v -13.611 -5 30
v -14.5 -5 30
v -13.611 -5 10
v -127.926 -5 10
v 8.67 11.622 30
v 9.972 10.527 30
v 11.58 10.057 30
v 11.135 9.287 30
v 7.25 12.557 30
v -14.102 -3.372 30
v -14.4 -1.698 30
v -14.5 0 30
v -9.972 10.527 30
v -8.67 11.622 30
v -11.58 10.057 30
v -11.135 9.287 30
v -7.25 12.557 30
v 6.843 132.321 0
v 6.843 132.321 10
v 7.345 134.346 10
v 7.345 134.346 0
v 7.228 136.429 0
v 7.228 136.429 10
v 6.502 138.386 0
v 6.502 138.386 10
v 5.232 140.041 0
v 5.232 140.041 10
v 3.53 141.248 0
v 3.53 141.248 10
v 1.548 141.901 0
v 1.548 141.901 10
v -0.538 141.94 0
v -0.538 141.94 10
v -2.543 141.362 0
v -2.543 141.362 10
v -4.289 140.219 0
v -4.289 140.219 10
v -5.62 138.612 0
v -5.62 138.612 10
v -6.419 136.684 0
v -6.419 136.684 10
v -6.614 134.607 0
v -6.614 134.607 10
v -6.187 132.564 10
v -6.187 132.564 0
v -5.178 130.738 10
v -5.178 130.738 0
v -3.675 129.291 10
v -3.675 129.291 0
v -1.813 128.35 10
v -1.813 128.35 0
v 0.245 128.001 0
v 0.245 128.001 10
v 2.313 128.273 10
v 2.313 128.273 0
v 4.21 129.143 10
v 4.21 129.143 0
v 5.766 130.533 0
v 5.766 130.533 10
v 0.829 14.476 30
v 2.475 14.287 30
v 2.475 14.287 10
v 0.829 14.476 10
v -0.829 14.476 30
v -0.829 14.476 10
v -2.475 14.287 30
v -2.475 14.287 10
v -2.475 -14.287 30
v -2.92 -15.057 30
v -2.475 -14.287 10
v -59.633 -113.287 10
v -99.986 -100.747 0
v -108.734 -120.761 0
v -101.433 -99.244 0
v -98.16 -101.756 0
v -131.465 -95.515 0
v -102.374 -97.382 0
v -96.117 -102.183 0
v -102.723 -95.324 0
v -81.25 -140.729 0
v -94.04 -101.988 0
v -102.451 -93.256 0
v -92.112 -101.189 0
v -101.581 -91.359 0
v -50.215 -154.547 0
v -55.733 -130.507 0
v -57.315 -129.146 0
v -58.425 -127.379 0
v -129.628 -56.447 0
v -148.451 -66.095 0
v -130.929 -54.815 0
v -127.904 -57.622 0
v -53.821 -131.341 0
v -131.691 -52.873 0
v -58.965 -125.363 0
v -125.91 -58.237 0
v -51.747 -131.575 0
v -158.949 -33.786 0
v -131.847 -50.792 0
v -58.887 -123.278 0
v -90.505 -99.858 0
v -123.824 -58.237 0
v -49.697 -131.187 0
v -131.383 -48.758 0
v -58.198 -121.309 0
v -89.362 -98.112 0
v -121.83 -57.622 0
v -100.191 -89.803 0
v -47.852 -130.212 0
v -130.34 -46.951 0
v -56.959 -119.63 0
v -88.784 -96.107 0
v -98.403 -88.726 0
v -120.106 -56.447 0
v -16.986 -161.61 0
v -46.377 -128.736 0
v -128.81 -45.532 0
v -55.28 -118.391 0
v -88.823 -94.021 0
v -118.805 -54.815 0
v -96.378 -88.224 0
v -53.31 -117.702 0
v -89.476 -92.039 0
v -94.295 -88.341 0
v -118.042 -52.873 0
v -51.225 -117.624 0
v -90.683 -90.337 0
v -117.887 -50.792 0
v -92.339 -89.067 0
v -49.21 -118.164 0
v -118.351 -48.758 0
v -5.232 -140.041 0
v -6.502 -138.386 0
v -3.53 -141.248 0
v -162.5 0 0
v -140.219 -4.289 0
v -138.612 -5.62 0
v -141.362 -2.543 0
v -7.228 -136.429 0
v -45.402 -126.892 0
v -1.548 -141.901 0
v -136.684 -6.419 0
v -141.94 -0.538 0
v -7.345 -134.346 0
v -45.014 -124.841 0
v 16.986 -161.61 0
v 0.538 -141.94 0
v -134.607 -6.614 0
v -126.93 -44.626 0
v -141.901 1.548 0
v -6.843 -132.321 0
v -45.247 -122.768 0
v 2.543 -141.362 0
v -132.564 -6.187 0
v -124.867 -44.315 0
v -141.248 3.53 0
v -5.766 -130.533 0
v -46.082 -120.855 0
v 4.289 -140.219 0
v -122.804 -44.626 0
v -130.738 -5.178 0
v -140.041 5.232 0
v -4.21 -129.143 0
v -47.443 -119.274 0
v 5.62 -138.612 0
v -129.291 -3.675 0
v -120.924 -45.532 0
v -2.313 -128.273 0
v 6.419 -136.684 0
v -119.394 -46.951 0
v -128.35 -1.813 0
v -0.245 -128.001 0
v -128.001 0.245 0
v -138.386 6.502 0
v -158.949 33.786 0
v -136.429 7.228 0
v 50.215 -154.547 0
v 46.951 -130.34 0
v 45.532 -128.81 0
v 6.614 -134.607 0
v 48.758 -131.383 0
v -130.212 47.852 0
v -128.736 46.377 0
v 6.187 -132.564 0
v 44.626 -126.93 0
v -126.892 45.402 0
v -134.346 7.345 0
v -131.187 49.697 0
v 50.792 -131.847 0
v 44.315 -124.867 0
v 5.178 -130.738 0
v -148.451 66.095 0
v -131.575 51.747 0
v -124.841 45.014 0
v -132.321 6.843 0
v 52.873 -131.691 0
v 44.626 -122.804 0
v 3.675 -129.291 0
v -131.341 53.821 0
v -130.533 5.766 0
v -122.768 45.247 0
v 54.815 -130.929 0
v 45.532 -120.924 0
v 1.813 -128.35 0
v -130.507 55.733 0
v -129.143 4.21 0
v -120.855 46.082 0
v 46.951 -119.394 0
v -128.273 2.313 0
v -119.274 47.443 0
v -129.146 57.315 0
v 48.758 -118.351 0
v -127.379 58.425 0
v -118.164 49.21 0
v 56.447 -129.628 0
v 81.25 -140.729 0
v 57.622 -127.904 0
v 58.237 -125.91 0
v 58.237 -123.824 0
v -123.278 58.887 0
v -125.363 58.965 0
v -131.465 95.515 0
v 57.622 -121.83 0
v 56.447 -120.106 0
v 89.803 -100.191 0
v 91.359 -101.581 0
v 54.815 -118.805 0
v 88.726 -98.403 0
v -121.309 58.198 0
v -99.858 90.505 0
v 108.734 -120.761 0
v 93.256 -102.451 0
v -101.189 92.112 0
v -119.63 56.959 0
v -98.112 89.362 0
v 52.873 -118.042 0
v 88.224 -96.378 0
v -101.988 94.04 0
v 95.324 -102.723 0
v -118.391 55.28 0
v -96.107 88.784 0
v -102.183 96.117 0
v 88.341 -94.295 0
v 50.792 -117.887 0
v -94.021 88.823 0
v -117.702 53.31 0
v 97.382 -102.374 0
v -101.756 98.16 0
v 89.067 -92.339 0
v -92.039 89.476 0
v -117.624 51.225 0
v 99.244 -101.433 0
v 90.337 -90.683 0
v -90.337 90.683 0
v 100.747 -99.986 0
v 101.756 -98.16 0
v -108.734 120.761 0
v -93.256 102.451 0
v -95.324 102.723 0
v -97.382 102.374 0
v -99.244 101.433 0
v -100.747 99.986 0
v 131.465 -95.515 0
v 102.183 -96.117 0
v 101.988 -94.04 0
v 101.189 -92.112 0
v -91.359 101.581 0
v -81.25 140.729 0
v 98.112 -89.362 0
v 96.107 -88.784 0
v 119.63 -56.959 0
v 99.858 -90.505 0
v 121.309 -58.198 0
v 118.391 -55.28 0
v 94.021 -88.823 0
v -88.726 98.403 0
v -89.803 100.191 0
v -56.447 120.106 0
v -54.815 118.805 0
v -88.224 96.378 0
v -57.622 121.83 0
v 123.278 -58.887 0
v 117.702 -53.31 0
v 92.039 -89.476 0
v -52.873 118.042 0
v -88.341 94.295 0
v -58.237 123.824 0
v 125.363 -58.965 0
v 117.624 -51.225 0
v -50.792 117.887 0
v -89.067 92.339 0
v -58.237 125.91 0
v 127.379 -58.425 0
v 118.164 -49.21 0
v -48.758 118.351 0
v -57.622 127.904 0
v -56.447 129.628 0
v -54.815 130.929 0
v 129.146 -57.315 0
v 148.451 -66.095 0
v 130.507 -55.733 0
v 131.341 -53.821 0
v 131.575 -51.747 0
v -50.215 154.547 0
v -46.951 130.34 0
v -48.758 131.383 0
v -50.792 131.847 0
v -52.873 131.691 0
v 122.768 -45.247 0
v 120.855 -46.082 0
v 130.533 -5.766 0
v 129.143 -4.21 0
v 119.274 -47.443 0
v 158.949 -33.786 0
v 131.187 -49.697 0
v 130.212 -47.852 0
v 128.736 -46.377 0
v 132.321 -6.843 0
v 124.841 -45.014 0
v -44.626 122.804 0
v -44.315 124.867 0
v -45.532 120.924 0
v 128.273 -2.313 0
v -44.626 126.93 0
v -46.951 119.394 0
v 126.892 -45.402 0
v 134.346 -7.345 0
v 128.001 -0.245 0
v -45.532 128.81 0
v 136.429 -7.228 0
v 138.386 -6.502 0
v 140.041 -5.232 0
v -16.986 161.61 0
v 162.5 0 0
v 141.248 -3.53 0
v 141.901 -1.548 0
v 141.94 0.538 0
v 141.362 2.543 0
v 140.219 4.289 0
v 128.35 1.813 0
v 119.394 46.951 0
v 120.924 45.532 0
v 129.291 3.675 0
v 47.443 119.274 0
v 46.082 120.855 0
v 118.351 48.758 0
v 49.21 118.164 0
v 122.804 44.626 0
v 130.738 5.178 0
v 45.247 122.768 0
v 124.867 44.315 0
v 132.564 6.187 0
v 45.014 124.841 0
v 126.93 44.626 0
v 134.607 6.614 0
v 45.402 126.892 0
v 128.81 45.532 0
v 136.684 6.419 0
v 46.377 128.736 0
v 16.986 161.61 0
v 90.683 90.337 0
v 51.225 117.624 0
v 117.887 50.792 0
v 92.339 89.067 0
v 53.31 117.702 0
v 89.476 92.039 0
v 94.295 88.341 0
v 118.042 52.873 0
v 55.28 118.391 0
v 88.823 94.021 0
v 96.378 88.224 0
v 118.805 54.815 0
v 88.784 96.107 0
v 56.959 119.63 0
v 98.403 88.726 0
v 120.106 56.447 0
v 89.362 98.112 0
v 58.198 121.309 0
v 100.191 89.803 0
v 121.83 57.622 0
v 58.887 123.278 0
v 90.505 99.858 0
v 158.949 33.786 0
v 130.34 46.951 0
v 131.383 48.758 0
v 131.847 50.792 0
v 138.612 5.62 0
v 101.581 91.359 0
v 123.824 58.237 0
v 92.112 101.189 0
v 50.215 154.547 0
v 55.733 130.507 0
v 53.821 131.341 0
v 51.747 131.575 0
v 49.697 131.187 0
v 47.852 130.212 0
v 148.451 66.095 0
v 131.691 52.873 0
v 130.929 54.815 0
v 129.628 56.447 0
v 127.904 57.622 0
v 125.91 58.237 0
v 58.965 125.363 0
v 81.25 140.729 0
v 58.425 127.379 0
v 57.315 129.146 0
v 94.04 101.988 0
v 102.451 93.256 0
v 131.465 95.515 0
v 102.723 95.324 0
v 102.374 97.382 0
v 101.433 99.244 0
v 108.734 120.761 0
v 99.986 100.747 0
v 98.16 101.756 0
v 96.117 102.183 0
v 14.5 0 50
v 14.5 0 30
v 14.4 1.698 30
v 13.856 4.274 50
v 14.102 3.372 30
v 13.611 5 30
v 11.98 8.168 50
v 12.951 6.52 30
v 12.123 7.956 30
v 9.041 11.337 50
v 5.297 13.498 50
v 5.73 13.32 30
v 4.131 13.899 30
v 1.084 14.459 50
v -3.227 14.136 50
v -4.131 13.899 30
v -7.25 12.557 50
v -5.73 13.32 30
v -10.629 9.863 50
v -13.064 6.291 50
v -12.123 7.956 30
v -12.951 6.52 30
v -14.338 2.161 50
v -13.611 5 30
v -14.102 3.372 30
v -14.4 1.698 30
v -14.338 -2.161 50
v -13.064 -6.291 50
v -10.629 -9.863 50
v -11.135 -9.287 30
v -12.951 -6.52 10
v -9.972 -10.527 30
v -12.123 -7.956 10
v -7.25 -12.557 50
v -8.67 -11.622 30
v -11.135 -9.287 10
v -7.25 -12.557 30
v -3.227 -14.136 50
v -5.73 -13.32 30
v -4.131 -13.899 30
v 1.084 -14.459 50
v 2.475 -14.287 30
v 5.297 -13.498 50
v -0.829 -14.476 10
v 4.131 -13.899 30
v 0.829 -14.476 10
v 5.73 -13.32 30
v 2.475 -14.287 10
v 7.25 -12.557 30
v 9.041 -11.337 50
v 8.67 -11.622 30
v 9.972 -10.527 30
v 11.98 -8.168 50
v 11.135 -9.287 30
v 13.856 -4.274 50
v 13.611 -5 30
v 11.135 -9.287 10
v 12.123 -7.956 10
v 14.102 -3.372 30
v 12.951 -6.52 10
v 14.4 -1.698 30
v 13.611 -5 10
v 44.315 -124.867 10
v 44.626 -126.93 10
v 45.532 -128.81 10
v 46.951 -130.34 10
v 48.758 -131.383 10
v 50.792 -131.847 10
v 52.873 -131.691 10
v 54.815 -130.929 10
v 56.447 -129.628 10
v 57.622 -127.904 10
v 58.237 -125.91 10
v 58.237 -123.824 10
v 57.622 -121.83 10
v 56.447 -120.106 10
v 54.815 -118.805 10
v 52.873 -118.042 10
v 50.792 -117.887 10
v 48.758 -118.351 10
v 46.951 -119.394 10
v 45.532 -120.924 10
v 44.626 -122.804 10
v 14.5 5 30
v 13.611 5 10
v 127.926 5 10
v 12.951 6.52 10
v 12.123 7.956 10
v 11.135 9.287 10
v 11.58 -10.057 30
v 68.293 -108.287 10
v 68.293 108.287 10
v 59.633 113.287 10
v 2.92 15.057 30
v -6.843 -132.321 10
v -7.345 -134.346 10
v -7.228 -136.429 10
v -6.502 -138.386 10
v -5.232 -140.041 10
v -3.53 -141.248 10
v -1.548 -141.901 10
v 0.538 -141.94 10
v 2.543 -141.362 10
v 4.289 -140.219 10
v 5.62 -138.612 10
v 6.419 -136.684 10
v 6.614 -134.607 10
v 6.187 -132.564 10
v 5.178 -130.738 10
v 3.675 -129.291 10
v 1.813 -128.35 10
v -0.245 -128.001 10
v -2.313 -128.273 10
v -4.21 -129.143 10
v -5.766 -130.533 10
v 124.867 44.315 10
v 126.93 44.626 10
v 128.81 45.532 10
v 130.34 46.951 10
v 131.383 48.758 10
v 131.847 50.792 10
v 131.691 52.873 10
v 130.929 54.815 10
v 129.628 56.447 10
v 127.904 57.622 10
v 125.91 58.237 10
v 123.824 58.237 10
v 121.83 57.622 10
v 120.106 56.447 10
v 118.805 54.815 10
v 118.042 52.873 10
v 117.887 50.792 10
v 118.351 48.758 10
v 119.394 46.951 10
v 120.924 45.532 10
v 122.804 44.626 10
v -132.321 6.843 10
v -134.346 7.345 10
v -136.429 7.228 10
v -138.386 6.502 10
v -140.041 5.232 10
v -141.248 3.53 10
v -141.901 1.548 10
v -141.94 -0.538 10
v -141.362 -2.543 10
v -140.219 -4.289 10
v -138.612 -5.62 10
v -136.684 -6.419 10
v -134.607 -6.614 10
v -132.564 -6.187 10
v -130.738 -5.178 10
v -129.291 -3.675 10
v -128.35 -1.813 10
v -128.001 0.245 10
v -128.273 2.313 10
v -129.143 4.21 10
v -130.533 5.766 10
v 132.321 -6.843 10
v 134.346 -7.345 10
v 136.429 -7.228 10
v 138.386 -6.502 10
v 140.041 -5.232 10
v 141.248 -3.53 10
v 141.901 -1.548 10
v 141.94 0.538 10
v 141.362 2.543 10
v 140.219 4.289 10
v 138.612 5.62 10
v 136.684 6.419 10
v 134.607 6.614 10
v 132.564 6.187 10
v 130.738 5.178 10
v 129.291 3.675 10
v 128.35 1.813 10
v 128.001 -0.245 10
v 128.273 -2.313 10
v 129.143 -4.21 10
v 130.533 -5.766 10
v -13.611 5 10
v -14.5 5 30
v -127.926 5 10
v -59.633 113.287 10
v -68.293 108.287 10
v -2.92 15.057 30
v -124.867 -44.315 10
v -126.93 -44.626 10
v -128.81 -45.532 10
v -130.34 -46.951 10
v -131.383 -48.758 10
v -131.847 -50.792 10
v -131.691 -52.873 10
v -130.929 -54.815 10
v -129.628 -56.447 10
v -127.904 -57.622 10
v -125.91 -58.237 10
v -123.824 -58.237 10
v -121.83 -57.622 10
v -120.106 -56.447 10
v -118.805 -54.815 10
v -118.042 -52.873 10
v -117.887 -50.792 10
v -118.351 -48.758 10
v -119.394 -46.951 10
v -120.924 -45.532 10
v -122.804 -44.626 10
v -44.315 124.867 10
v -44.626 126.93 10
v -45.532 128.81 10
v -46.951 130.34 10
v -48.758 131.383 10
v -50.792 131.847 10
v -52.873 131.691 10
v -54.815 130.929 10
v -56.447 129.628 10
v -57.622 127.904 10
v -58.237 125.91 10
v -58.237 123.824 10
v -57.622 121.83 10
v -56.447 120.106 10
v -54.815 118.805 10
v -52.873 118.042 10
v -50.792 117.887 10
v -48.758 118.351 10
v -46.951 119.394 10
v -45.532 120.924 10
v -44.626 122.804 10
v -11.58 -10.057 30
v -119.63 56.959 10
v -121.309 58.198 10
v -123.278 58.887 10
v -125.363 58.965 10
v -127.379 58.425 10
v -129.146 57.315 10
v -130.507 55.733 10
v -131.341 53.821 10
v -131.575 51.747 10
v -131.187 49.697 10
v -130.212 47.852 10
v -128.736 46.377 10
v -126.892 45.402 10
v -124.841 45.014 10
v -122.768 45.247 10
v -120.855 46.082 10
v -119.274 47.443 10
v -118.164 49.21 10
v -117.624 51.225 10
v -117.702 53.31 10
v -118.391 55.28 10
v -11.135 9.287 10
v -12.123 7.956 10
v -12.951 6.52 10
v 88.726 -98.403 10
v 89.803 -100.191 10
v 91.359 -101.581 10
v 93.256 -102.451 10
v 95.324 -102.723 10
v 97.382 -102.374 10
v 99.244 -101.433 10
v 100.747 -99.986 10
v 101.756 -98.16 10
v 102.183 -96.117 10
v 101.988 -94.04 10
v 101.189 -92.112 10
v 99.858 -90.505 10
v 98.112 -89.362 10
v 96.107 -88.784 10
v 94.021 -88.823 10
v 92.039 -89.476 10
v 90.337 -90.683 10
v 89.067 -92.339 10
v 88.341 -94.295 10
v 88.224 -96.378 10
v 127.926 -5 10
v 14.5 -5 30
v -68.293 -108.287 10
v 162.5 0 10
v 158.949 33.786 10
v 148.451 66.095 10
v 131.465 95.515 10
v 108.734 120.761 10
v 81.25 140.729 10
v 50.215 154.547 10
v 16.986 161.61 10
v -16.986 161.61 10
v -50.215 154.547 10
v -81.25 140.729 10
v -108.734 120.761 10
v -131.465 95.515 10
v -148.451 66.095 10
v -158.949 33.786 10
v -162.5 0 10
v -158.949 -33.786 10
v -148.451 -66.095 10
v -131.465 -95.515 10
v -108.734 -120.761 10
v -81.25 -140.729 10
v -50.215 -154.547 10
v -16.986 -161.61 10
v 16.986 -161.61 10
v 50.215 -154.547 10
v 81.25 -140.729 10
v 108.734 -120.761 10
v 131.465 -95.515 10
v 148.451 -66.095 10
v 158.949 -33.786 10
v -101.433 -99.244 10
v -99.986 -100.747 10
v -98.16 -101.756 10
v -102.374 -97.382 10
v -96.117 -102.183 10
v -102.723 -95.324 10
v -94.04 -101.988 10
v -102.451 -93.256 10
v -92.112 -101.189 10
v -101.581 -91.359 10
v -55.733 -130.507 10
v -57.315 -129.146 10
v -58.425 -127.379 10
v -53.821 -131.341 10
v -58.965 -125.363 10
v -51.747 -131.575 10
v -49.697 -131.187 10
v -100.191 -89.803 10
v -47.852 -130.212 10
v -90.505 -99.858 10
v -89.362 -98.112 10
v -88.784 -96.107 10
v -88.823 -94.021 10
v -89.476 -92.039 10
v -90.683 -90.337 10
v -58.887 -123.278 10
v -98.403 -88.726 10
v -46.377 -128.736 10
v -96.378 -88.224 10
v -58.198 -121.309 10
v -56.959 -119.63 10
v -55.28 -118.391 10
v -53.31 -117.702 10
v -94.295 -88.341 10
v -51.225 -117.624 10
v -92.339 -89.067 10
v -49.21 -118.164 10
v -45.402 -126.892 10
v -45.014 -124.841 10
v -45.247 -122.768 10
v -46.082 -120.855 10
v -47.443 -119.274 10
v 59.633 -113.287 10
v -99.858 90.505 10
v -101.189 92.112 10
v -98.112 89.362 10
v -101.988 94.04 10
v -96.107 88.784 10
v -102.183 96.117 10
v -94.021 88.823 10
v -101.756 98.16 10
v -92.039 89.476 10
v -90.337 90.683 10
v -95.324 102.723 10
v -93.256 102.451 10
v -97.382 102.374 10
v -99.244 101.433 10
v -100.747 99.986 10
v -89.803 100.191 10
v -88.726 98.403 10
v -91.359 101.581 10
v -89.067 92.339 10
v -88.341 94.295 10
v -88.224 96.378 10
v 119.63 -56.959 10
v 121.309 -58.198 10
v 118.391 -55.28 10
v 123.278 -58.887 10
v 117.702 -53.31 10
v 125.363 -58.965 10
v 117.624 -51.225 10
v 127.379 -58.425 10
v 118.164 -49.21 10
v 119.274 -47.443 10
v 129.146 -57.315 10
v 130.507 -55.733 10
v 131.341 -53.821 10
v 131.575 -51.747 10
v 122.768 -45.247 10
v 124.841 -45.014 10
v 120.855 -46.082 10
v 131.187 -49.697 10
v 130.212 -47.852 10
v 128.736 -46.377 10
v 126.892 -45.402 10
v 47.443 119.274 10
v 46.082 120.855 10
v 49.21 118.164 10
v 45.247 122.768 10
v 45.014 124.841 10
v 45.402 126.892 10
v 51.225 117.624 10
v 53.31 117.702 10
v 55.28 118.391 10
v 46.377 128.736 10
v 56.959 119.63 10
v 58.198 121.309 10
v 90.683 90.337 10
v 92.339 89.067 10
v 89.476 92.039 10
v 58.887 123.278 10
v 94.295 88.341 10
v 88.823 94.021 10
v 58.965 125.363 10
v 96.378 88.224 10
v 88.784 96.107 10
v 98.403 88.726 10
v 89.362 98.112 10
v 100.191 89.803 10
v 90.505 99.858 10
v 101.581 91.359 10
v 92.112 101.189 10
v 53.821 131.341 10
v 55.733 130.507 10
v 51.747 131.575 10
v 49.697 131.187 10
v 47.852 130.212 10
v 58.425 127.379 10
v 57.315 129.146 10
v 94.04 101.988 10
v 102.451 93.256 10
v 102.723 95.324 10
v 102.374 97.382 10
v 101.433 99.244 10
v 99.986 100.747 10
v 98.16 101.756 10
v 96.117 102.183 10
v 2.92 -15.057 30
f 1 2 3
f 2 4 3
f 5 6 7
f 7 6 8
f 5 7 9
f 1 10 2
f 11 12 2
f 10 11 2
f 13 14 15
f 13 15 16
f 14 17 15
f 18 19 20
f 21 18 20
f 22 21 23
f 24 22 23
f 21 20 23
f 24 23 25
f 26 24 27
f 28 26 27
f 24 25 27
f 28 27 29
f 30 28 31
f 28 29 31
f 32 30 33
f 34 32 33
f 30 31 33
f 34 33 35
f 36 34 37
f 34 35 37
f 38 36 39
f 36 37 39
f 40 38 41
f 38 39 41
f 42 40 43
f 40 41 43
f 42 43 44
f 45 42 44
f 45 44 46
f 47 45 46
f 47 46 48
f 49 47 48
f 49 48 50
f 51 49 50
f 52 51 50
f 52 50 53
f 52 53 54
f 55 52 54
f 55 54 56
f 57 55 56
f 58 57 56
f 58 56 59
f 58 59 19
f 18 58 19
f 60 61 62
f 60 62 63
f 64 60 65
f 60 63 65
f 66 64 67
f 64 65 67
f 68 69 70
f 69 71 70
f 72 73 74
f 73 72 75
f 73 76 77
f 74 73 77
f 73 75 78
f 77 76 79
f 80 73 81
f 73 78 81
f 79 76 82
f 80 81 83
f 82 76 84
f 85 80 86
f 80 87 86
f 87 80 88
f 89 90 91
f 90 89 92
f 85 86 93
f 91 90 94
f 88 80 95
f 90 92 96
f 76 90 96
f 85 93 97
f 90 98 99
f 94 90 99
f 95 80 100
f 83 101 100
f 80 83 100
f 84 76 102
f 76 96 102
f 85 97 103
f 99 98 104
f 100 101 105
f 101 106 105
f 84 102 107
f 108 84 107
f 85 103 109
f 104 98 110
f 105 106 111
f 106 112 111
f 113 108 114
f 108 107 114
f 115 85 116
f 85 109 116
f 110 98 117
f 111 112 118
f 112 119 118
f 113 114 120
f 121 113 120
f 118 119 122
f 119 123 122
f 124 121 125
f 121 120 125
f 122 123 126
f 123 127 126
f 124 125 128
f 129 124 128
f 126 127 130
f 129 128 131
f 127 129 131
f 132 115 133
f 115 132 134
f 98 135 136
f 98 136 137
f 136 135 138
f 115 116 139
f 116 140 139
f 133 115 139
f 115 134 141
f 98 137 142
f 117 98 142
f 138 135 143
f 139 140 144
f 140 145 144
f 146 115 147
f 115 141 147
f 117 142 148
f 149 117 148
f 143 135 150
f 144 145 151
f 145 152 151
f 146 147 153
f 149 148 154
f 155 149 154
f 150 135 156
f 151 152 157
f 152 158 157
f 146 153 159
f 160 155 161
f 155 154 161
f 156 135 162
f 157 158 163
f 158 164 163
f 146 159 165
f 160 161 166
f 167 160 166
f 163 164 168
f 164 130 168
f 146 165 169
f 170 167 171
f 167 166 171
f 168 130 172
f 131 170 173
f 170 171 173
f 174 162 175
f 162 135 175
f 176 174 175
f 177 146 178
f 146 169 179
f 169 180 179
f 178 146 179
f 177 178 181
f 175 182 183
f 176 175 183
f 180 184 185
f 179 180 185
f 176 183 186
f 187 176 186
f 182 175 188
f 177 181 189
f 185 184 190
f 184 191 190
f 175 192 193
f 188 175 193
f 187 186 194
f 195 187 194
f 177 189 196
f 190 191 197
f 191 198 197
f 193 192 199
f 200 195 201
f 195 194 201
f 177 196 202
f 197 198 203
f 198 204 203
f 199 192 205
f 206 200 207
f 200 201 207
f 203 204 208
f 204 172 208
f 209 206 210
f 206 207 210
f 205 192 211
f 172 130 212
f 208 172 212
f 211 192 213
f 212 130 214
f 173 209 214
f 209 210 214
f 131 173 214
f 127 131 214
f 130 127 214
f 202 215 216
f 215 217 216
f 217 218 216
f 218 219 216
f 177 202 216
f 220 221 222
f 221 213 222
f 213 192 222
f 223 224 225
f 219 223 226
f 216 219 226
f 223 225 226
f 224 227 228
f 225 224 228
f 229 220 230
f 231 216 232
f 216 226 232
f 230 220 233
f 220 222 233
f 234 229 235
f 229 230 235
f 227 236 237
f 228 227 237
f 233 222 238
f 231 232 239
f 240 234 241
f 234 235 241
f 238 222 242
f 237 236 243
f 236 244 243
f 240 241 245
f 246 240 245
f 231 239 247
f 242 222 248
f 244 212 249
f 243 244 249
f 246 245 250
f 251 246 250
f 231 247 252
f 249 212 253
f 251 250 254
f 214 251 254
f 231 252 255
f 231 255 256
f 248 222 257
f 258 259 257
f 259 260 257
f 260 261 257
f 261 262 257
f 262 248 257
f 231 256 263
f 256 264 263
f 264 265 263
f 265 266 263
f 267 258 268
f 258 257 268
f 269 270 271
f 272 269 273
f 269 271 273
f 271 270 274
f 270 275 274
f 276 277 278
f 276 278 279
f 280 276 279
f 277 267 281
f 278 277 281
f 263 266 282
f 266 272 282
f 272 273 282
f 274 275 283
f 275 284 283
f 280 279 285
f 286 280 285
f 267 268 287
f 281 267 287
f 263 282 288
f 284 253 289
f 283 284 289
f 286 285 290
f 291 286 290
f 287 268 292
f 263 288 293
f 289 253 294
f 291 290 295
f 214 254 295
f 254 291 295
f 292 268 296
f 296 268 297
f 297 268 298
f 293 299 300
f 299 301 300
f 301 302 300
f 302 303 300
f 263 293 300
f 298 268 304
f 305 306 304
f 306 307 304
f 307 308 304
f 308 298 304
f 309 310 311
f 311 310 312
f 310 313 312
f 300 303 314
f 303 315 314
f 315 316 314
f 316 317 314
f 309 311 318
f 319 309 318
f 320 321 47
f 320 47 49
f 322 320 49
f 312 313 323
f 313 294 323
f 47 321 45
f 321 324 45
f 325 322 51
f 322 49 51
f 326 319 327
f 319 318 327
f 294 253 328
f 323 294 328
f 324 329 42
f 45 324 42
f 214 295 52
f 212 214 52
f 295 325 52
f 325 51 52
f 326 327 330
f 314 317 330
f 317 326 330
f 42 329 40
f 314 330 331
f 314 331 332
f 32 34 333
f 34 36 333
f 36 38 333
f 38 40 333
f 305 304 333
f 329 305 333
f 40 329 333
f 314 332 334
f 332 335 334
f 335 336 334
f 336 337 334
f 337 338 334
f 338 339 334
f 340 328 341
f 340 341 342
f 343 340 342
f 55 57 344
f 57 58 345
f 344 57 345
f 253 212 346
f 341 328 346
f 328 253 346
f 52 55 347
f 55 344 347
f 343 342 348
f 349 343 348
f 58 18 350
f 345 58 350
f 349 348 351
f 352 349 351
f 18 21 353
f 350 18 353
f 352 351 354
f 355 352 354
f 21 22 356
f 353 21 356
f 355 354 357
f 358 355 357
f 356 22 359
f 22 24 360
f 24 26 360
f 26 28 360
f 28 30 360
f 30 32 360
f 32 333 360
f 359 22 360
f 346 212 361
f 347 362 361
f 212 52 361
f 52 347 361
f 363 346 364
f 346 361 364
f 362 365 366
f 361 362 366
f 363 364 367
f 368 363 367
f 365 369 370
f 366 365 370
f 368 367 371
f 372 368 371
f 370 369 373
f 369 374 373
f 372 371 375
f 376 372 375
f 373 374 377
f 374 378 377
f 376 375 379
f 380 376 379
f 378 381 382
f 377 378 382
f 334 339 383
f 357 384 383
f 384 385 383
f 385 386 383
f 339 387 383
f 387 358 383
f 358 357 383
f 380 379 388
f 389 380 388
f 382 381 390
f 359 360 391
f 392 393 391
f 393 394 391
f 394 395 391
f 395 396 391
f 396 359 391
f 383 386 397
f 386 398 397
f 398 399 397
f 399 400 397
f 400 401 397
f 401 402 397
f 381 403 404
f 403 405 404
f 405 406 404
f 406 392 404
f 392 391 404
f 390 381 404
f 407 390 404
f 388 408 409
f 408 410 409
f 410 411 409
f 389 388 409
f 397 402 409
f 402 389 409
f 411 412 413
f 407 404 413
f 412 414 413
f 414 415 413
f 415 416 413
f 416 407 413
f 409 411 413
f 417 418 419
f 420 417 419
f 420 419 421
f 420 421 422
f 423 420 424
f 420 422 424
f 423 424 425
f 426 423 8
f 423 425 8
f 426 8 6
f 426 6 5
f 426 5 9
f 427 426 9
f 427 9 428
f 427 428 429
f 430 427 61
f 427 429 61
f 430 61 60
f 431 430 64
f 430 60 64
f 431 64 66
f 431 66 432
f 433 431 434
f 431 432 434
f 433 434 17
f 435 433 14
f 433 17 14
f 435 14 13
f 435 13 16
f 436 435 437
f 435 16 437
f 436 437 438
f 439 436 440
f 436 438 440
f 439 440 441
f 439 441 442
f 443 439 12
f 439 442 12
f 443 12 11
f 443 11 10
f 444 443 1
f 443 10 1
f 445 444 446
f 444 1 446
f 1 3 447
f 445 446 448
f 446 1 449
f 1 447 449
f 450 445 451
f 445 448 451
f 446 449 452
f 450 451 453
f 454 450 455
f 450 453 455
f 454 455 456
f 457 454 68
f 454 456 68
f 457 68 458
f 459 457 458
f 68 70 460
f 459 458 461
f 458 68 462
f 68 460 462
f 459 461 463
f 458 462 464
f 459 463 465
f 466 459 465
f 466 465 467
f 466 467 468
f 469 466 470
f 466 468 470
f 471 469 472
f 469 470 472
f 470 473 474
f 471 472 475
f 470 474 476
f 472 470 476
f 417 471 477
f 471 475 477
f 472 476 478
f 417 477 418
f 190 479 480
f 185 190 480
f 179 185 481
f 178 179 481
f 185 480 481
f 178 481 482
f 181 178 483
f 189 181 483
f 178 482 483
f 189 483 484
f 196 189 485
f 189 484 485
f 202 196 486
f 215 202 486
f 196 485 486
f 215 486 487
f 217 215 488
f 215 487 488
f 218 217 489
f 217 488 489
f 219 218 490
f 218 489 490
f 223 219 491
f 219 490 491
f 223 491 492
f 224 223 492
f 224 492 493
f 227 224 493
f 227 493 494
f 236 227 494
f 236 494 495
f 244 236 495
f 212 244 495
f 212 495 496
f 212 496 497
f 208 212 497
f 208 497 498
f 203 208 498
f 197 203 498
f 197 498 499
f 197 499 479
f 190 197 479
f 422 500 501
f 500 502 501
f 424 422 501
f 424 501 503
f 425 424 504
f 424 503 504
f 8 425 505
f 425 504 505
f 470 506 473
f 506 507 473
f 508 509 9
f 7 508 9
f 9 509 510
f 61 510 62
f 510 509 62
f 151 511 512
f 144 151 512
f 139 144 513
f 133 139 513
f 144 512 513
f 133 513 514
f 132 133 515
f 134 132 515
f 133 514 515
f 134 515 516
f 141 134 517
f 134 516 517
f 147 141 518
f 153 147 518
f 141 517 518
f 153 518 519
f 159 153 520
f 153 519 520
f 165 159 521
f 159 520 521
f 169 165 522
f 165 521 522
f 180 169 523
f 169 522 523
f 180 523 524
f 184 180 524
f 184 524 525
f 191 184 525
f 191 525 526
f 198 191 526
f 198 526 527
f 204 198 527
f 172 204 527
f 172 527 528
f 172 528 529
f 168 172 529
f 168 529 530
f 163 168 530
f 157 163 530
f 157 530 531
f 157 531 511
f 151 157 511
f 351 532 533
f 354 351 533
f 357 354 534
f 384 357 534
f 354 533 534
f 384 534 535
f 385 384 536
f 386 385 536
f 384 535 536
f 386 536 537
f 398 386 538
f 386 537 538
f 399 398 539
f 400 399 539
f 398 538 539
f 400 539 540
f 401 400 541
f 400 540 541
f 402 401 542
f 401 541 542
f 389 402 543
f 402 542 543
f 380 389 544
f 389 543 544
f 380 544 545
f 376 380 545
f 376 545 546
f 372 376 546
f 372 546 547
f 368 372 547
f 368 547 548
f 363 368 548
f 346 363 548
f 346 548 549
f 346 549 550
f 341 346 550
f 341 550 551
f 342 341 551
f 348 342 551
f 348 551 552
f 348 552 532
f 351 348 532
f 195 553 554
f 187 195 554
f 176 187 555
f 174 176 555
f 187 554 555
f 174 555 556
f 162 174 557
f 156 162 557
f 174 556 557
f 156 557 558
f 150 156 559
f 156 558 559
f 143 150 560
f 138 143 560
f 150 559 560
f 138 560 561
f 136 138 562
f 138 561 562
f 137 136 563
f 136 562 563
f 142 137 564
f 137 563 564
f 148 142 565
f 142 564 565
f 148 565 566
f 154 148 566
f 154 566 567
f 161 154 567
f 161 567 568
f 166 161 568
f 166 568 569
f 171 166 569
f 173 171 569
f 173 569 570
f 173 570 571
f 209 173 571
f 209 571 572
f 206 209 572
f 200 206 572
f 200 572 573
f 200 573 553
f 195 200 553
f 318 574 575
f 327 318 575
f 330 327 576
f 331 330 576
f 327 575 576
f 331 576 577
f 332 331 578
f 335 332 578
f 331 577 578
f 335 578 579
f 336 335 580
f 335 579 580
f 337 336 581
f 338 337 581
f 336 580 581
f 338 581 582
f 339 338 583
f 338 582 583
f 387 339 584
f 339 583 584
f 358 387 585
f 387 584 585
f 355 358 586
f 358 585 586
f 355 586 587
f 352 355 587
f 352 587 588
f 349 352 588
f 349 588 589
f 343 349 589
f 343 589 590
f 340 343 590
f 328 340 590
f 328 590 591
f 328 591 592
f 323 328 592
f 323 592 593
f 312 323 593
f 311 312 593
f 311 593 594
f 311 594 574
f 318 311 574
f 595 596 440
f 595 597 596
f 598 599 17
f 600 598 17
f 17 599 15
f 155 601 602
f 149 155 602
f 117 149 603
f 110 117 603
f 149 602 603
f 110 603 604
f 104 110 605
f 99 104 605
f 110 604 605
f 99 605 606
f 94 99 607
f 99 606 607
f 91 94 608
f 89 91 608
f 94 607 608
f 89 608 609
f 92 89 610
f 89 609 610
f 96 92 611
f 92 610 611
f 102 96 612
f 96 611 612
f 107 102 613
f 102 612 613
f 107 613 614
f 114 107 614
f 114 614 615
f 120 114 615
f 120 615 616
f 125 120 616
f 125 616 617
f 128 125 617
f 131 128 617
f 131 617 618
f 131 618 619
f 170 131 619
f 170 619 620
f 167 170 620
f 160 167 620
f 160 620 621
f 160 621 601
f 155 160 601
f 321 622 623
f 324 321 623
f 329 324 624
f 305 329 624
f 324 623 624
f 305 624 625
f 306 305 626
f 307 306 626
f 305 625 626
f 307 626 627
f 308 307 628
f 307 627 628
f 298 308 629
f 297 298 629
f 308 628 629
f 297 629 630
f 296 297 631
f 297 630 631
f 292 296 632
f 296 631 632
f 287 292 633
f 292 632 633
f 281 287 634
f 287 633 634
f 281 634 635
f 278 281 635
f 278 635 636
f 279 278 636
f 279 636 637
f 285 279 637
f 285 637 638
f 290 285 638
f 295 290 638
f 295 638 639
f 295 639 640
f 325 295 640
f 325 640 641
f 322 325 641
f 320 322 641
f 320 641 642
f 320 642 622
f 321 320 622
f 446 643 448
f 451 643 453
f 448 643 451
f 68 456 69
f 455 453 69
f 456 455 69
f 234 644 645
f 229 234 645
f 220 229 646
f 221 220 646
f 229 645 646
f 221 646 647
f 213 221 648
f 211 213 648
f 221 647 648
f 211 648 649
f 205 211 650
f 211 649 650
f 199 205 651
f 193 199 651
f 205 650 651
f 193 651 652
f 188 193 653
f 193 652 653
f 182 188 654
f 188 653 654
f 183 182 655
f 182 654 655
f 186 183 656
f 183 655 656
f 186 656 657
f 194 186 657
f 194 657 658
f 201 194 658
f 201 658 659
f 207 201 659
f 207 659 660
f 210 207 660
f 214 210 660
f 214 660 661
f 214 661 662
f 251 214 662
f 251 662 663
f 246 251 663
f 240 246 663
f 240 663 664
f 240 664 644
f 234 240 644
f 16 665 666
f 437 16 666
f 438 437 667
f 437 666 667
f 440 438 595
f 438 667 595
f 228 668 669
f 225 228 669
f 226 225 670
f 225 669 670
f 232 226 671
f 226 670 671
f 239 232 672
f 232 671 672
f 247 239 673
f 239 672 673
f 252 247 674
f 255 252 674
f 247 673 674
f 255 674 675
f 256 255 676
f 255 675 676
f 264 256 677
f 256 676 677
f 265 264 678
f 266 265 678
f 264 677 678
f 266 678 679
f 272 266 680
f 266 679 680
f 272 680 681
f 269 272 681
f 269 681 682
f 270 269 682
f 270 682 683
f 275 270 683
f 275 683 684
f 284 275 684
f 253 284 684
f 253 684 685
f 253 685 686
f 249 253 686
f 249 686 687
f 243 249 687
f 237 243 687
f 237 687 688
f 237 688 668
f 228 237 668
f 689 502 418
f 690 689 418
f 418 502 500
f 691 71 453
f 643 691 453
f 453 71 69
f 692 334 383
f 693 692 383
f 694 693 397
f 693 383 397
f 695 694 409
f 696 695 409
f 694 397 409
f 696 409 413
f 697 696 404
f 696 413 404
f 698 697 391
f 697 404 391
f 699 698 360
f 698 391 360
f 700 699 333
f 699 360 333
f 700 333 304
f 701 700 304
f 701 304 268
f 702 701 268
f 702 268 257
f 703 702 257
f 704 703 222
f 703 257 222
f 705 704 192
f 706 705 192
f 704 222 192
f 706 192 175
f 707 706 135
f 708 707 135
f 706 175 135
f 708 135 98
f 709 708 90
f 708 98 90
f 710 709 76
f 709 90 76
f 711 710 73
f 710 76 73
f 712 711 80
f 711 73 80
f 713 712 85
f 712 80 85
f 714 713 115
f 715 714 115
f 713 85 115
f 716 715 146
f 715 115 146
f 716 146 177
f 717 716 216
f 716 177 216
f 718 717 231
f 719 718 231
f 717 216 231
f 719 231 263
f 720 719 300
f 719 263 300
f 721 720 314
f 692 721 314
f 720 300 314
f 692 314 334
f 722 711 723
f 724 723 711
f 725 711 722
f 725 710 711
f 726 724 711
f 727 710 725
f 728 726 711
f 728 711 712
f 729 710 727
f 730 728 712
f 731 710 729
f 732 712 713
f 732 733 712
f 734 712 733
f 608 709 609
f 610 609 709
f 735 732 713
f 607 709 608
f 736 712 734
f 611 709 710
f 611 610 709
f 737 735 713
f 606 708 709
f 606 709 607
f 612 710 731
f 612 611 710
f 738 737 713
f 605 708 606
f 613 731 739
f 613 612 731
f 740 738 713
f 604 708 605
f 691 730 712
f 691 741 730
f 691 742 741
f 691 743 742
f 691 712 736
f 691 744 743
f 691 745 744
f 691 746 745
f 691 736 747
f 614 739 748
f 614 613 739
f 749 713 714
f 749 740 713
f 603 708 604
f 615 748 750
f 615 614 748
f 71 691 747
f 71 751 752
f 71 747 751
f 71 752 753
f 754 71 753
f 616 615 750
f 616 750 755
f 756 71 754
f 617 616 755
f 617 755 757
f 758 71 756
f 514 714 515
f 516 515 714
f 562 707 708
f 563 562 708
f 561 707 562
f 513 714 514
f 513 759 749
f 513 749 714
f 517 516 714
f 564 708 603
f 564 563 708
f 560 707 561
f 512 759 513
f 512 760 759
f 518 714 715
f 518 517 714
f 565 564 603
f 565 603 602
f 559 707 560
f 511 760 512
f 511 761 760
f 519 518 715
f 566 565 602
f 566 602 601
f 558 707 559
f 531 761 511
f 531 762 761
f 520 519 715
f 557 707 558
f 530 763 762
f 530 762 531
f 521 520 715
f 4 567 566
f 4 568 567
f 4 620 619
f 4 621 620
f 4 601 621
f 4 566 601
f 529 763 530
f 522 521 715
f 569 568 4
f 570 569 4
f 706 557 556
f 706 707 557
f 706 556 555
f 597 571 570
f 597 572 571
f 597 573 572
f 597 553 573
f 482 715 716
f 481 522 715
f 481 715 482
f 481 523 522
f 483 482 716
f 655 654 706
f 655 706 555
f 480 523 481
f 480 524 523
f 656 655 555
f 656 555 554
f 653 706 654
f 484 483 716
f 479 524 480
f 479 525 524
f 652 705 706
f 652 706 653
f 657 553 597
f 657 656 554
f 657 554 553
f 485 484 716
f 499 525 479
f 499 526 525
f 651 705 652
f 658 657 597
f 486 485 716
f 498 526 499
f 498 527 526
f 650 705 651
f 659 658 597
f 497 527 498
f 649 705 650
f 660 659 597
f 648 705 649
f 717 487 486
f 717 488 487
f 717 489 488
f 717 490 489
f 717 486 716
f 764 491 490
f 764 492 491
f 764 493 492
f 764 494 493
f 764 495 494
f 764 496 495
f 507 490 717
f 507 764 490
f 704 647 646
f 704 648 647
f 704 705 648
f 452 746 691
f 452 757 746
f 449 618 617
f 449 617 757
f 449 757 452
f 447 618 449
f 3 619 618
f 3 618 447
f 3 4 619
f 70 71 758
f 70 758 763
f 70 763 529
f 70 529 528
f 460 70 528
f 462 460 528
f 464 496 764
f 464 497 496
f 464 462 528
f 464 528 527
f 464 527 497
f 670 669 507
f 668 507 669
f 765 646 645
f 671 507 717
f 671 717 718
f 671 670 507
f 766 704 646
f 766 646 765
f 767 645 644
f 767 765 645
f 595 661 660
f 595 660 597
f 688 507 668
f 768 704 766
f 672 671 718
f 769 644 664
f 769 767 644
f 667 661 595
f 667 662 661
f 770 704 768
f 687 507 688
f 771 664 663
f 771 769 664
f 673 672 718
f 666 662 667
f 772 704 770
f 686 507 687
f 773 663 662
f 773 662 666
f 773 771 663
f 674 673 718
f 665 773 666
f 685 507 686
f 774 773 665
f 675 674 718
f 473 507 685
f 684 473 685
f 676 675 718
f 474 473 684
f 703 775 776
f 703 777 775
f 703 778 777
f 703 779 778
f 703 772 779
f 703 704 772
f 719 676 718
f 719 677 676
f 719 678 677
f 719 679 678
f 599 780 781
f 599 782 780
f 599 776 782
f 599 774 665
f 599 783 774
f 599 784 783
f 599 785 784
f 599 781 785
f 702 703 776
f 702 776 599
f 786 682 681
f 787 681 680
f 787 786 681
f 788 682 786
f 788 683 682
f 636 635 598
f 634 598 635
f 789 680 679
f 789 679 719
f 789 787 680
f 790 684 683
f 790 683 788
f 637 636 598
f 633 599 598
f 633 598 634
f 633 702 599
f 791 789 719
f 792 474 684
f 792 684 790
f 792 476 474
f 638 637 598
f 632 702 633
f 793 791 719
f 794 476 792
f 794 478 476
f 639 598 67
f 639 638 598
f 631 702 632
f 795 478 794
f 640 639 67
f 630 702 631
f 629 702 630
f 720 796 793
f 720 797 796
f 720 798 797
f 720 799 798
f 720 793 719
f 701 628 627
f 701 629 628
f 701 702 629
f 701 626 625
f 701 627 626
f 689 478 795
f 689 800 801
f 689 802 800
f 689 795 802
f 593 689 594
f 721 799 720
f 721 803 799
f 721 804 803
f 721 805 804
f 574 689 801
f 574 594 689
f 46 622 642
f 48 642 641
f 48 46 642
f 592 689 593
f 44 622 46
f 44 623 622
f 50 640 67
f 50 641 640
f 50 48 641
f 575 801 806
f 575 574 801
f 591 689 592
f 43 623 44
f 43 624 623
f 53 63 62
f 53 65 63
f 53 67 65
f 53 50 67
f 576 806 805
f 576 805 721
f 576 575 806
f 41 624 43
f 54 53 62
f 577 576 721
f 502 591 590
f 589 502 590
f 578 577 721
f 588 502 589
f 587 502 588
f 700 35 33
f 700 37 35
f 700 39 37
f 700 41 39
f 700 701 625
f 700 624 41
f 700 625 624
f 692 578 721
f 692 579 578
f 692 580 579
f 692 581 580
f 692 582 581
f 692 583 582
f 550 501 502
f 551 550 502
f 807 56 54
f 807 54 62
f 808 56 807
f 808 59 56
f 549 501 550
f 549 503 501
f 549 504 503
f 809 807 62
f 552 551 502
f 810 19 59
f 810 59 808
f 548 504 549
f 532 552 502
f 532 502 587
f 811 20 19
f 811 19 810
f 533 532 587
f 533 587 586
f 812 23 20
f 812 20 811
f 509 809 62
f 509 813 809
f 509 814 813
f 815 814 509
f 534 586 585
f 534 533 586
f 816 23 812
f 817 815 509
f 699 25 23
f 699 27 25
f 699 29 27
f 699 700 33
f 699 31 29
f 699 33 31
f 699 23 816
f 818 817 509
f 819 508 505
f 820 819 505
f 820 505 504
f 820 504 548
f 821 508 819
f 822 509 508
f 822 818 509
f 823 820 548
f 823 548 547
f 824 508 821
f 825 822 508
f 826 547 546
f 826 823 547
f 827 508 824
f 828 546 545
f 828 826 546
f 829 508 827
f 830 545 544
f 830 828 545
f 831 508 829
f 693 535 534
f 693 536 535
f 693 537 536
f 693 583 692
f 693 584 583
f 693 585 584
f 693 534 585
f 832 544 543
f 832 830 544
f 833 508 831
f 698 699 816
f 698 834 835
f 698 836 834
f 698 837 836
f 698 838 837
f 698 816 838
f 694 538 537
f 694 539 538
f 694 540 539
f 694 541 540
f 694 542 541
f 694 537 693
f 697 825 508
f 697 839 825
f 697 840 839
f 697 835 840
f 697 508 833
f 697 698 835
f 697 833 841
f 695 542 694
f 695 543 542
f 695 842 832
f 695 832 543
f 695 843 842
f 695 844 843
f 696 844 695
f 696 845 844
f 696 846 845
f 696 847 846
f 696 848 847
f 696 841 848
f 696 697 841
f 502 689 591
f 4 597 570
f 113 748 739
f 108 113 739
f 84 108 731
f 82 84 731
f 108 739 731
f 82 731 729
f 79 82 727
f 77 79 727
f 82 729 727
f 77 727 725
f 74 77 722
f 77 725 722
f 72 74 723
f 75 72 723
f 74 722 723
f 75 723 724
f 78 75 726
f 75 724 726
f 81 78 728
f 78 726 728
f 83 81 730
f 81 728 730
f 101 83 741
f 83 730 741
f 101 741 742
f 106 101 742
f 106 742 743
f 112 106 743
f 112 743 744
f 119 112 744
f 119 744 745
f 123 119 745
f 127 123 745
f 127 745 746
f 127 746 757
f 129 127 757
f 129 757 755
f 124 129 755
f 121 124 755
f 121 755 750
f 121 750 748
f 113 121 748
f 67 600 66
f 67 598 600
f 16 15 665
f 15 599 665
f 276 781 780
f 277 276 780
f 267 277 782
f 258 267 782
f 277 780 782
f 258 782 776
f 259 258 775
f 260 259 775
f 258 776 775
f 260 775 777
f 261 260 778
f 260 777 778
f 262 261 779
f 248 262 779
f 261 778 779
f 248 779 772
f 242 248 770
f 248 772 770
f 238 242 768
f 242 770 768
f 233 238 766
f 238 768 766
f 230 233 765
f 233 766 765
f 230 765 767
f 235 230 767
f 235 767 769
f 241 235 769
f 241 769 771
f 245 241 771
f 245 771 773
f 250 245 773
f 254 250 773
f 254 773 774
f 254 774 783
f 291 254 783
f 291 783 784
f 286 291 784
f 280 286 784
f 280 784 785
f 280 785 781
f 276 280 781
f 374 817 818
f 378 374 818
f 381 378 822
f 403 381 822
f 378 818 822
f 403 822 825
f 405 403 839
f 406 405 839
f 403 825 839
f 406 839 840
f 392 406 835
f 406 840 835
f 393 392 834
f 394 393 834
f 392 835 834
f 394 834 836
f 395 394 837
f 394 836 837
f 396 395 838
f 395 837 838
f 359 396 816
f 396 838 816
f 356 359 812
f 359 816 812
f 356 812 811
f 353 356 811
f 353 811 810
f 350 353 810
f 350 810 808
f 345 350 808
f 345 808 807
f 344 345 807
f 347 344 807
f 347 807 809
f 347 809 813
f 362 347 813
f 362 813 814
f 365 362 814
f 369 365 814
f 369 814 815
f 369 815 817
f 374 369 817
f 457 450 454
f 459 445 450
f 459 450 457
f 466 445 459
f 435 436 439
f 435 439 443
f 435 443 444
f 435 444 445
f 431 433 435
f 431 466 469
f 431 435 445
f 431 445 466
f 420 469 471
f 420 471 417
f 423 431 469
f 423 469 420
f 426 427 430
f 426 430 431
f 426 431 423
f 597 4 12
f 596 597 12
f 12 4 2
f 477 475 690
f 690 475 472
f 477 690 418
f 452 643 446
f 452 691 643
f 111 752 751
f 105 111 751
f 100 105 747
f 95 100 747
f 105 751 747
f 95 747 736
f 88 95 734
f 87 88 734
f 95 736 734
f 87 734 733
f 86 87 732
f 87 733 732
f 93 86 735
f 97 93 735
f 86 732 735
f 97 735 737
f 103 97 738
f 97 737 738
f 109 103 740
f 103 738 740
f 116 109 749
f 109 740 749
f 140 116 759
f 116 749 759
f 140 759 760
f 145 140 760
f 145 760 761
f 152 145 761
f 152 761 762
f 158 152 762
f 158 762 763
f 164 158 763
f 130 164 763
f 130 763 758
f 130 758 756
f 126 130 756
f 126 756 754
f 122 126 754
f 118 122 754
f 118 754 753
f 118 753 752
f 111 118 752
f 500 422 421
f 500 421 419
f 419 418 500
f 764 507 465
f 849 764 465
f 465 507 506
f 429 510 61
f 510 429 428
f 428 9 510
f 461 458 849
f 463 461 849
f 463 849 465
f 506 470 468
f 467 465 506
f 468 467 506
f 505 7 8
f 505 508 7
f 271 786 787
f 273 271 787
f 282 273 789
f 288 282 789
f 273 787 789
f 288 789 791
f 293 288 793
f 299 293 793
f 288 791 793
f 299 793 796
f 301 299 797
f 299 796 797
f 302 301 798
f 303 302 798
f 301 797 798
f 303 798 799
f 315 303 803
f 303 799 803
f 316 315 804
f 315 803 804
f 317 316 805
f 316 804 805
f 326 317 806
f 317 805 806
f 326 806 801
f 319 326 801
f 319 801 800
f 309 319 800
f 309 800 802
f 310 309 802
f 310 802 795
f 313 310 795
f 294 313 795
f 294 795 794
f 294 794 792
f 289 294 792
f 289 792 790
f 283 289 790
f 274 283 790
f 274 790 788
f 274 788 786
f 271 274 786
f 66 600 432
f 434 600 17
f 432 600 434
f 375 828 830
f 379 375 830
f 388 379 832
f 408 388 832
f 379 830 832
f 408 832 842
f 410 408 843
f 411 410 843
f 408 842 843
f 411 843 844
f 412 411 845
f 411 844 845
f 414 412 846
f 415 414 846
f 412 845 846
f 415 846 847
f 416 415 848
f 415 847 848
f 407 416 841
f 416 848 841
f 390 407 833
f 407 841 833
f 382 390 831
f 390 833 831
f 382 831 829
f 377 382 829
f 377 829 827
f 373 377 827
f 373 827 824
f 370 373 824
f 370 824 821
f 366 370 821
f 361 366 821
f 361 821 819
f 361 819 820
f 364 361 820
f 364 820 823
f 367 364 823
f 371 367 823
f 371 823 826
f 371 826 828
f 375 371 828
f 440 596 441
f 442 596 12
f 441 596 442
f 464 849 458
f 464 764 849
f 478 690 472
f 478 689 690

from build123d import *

# Parameters (mm, degrees)
SKETCH1_R           = 162.5
BOSS_EXTRUDE1_DEPTH = 10
SKETCH2_R           = 7
CUT_EXTRUDE1_DEPTH  = 231.027172308
CIRPATTERN1_COUNT   = 16
SKETCH3_R           = 14.5
BOSS_EXTRUDE2_DEPTH = 20
RIB1_START          = -5
RIB1_DEPTH          = 10
CIRPATTERN2_COUNT   = 6
SKETCH6_R           = 14.5
BOSS_EXTRUDE3_DEPTH = 20


with BuildPart() as part:
    # Sketch1 → Boss-Extrude1 (new body)
    with BuildSketch(Plane.XY):
        Circle(SKETCH1_R)
    extrude(amount=BOSS_EXTRUDE1_DEPTH)

    # Sketch2 → Cut-Extrude1 (cut, through all)
    with BuildSketch(Plane.XY.offset(10)):
        with Locations((-51.315180135, 124.866938329)):
            Circle(SKETCH2_R)
    cut_extrude1 = extrude(amount=-CUT_EXTRUDE1_DEPTH, mode=Mode.SUBTRACT)

    # CirPattern1: Cut-Extrude1 ×16 about axis
    cirpattern1_axis = Axis((0, 0, 0), (0, 0, 1))
    for i in range(1, CIRPATTERN1_COUNT):
        add(cut_extrude1.rotate(cirpattern1_axis, i * 360 / CIRPATTERN1_COUNT), mode=Mode.SUBTRACT)

    # Sketch3 → Boss-Extrude2 (add)
    with BuildSketch(Plane.XY.offset(10)):
        Circle(SKETCH3_R)
    extrude(amount=BOSS_EXTRUDE2_DEPTH)

    # Rib1: read off the stored shape, not the designer's step
    # Rib1 outline → Rib1 (add)
    with BuildSketch(Plane(origin=(0, 0, 0), x_dir=(1, 0, 0), z_dir=(0, 1, 0)).offset(RIB1_START)):
        Polygon((-14.5, -30), (-13.610657589, -30), (-13.610657589, -10), (-127.925636392, -10), align=None)
    rib1 = extrude(amount=RIB1_DEPTH)

    # CirPattern2: Rib1 ×6 about axis
    cirpattern2_axis = Axis((0, 0, 0), (0, 0, 1))
    for i in range(1, CIRPATTERN2_COUNT):
        add(rib1.rotate(cirpattern2_axis, i * 360 / CIRPATTERN2_COUNT))

    # Sketch6 → Boss-Extrude3 (add)
    with BuildSketch(Plane.XY.offset(30)):
        Circle(SKETCH6_R)
    extrude(amount=BOSS_EXTRUDE3_DEPTH)


solid = part.part
